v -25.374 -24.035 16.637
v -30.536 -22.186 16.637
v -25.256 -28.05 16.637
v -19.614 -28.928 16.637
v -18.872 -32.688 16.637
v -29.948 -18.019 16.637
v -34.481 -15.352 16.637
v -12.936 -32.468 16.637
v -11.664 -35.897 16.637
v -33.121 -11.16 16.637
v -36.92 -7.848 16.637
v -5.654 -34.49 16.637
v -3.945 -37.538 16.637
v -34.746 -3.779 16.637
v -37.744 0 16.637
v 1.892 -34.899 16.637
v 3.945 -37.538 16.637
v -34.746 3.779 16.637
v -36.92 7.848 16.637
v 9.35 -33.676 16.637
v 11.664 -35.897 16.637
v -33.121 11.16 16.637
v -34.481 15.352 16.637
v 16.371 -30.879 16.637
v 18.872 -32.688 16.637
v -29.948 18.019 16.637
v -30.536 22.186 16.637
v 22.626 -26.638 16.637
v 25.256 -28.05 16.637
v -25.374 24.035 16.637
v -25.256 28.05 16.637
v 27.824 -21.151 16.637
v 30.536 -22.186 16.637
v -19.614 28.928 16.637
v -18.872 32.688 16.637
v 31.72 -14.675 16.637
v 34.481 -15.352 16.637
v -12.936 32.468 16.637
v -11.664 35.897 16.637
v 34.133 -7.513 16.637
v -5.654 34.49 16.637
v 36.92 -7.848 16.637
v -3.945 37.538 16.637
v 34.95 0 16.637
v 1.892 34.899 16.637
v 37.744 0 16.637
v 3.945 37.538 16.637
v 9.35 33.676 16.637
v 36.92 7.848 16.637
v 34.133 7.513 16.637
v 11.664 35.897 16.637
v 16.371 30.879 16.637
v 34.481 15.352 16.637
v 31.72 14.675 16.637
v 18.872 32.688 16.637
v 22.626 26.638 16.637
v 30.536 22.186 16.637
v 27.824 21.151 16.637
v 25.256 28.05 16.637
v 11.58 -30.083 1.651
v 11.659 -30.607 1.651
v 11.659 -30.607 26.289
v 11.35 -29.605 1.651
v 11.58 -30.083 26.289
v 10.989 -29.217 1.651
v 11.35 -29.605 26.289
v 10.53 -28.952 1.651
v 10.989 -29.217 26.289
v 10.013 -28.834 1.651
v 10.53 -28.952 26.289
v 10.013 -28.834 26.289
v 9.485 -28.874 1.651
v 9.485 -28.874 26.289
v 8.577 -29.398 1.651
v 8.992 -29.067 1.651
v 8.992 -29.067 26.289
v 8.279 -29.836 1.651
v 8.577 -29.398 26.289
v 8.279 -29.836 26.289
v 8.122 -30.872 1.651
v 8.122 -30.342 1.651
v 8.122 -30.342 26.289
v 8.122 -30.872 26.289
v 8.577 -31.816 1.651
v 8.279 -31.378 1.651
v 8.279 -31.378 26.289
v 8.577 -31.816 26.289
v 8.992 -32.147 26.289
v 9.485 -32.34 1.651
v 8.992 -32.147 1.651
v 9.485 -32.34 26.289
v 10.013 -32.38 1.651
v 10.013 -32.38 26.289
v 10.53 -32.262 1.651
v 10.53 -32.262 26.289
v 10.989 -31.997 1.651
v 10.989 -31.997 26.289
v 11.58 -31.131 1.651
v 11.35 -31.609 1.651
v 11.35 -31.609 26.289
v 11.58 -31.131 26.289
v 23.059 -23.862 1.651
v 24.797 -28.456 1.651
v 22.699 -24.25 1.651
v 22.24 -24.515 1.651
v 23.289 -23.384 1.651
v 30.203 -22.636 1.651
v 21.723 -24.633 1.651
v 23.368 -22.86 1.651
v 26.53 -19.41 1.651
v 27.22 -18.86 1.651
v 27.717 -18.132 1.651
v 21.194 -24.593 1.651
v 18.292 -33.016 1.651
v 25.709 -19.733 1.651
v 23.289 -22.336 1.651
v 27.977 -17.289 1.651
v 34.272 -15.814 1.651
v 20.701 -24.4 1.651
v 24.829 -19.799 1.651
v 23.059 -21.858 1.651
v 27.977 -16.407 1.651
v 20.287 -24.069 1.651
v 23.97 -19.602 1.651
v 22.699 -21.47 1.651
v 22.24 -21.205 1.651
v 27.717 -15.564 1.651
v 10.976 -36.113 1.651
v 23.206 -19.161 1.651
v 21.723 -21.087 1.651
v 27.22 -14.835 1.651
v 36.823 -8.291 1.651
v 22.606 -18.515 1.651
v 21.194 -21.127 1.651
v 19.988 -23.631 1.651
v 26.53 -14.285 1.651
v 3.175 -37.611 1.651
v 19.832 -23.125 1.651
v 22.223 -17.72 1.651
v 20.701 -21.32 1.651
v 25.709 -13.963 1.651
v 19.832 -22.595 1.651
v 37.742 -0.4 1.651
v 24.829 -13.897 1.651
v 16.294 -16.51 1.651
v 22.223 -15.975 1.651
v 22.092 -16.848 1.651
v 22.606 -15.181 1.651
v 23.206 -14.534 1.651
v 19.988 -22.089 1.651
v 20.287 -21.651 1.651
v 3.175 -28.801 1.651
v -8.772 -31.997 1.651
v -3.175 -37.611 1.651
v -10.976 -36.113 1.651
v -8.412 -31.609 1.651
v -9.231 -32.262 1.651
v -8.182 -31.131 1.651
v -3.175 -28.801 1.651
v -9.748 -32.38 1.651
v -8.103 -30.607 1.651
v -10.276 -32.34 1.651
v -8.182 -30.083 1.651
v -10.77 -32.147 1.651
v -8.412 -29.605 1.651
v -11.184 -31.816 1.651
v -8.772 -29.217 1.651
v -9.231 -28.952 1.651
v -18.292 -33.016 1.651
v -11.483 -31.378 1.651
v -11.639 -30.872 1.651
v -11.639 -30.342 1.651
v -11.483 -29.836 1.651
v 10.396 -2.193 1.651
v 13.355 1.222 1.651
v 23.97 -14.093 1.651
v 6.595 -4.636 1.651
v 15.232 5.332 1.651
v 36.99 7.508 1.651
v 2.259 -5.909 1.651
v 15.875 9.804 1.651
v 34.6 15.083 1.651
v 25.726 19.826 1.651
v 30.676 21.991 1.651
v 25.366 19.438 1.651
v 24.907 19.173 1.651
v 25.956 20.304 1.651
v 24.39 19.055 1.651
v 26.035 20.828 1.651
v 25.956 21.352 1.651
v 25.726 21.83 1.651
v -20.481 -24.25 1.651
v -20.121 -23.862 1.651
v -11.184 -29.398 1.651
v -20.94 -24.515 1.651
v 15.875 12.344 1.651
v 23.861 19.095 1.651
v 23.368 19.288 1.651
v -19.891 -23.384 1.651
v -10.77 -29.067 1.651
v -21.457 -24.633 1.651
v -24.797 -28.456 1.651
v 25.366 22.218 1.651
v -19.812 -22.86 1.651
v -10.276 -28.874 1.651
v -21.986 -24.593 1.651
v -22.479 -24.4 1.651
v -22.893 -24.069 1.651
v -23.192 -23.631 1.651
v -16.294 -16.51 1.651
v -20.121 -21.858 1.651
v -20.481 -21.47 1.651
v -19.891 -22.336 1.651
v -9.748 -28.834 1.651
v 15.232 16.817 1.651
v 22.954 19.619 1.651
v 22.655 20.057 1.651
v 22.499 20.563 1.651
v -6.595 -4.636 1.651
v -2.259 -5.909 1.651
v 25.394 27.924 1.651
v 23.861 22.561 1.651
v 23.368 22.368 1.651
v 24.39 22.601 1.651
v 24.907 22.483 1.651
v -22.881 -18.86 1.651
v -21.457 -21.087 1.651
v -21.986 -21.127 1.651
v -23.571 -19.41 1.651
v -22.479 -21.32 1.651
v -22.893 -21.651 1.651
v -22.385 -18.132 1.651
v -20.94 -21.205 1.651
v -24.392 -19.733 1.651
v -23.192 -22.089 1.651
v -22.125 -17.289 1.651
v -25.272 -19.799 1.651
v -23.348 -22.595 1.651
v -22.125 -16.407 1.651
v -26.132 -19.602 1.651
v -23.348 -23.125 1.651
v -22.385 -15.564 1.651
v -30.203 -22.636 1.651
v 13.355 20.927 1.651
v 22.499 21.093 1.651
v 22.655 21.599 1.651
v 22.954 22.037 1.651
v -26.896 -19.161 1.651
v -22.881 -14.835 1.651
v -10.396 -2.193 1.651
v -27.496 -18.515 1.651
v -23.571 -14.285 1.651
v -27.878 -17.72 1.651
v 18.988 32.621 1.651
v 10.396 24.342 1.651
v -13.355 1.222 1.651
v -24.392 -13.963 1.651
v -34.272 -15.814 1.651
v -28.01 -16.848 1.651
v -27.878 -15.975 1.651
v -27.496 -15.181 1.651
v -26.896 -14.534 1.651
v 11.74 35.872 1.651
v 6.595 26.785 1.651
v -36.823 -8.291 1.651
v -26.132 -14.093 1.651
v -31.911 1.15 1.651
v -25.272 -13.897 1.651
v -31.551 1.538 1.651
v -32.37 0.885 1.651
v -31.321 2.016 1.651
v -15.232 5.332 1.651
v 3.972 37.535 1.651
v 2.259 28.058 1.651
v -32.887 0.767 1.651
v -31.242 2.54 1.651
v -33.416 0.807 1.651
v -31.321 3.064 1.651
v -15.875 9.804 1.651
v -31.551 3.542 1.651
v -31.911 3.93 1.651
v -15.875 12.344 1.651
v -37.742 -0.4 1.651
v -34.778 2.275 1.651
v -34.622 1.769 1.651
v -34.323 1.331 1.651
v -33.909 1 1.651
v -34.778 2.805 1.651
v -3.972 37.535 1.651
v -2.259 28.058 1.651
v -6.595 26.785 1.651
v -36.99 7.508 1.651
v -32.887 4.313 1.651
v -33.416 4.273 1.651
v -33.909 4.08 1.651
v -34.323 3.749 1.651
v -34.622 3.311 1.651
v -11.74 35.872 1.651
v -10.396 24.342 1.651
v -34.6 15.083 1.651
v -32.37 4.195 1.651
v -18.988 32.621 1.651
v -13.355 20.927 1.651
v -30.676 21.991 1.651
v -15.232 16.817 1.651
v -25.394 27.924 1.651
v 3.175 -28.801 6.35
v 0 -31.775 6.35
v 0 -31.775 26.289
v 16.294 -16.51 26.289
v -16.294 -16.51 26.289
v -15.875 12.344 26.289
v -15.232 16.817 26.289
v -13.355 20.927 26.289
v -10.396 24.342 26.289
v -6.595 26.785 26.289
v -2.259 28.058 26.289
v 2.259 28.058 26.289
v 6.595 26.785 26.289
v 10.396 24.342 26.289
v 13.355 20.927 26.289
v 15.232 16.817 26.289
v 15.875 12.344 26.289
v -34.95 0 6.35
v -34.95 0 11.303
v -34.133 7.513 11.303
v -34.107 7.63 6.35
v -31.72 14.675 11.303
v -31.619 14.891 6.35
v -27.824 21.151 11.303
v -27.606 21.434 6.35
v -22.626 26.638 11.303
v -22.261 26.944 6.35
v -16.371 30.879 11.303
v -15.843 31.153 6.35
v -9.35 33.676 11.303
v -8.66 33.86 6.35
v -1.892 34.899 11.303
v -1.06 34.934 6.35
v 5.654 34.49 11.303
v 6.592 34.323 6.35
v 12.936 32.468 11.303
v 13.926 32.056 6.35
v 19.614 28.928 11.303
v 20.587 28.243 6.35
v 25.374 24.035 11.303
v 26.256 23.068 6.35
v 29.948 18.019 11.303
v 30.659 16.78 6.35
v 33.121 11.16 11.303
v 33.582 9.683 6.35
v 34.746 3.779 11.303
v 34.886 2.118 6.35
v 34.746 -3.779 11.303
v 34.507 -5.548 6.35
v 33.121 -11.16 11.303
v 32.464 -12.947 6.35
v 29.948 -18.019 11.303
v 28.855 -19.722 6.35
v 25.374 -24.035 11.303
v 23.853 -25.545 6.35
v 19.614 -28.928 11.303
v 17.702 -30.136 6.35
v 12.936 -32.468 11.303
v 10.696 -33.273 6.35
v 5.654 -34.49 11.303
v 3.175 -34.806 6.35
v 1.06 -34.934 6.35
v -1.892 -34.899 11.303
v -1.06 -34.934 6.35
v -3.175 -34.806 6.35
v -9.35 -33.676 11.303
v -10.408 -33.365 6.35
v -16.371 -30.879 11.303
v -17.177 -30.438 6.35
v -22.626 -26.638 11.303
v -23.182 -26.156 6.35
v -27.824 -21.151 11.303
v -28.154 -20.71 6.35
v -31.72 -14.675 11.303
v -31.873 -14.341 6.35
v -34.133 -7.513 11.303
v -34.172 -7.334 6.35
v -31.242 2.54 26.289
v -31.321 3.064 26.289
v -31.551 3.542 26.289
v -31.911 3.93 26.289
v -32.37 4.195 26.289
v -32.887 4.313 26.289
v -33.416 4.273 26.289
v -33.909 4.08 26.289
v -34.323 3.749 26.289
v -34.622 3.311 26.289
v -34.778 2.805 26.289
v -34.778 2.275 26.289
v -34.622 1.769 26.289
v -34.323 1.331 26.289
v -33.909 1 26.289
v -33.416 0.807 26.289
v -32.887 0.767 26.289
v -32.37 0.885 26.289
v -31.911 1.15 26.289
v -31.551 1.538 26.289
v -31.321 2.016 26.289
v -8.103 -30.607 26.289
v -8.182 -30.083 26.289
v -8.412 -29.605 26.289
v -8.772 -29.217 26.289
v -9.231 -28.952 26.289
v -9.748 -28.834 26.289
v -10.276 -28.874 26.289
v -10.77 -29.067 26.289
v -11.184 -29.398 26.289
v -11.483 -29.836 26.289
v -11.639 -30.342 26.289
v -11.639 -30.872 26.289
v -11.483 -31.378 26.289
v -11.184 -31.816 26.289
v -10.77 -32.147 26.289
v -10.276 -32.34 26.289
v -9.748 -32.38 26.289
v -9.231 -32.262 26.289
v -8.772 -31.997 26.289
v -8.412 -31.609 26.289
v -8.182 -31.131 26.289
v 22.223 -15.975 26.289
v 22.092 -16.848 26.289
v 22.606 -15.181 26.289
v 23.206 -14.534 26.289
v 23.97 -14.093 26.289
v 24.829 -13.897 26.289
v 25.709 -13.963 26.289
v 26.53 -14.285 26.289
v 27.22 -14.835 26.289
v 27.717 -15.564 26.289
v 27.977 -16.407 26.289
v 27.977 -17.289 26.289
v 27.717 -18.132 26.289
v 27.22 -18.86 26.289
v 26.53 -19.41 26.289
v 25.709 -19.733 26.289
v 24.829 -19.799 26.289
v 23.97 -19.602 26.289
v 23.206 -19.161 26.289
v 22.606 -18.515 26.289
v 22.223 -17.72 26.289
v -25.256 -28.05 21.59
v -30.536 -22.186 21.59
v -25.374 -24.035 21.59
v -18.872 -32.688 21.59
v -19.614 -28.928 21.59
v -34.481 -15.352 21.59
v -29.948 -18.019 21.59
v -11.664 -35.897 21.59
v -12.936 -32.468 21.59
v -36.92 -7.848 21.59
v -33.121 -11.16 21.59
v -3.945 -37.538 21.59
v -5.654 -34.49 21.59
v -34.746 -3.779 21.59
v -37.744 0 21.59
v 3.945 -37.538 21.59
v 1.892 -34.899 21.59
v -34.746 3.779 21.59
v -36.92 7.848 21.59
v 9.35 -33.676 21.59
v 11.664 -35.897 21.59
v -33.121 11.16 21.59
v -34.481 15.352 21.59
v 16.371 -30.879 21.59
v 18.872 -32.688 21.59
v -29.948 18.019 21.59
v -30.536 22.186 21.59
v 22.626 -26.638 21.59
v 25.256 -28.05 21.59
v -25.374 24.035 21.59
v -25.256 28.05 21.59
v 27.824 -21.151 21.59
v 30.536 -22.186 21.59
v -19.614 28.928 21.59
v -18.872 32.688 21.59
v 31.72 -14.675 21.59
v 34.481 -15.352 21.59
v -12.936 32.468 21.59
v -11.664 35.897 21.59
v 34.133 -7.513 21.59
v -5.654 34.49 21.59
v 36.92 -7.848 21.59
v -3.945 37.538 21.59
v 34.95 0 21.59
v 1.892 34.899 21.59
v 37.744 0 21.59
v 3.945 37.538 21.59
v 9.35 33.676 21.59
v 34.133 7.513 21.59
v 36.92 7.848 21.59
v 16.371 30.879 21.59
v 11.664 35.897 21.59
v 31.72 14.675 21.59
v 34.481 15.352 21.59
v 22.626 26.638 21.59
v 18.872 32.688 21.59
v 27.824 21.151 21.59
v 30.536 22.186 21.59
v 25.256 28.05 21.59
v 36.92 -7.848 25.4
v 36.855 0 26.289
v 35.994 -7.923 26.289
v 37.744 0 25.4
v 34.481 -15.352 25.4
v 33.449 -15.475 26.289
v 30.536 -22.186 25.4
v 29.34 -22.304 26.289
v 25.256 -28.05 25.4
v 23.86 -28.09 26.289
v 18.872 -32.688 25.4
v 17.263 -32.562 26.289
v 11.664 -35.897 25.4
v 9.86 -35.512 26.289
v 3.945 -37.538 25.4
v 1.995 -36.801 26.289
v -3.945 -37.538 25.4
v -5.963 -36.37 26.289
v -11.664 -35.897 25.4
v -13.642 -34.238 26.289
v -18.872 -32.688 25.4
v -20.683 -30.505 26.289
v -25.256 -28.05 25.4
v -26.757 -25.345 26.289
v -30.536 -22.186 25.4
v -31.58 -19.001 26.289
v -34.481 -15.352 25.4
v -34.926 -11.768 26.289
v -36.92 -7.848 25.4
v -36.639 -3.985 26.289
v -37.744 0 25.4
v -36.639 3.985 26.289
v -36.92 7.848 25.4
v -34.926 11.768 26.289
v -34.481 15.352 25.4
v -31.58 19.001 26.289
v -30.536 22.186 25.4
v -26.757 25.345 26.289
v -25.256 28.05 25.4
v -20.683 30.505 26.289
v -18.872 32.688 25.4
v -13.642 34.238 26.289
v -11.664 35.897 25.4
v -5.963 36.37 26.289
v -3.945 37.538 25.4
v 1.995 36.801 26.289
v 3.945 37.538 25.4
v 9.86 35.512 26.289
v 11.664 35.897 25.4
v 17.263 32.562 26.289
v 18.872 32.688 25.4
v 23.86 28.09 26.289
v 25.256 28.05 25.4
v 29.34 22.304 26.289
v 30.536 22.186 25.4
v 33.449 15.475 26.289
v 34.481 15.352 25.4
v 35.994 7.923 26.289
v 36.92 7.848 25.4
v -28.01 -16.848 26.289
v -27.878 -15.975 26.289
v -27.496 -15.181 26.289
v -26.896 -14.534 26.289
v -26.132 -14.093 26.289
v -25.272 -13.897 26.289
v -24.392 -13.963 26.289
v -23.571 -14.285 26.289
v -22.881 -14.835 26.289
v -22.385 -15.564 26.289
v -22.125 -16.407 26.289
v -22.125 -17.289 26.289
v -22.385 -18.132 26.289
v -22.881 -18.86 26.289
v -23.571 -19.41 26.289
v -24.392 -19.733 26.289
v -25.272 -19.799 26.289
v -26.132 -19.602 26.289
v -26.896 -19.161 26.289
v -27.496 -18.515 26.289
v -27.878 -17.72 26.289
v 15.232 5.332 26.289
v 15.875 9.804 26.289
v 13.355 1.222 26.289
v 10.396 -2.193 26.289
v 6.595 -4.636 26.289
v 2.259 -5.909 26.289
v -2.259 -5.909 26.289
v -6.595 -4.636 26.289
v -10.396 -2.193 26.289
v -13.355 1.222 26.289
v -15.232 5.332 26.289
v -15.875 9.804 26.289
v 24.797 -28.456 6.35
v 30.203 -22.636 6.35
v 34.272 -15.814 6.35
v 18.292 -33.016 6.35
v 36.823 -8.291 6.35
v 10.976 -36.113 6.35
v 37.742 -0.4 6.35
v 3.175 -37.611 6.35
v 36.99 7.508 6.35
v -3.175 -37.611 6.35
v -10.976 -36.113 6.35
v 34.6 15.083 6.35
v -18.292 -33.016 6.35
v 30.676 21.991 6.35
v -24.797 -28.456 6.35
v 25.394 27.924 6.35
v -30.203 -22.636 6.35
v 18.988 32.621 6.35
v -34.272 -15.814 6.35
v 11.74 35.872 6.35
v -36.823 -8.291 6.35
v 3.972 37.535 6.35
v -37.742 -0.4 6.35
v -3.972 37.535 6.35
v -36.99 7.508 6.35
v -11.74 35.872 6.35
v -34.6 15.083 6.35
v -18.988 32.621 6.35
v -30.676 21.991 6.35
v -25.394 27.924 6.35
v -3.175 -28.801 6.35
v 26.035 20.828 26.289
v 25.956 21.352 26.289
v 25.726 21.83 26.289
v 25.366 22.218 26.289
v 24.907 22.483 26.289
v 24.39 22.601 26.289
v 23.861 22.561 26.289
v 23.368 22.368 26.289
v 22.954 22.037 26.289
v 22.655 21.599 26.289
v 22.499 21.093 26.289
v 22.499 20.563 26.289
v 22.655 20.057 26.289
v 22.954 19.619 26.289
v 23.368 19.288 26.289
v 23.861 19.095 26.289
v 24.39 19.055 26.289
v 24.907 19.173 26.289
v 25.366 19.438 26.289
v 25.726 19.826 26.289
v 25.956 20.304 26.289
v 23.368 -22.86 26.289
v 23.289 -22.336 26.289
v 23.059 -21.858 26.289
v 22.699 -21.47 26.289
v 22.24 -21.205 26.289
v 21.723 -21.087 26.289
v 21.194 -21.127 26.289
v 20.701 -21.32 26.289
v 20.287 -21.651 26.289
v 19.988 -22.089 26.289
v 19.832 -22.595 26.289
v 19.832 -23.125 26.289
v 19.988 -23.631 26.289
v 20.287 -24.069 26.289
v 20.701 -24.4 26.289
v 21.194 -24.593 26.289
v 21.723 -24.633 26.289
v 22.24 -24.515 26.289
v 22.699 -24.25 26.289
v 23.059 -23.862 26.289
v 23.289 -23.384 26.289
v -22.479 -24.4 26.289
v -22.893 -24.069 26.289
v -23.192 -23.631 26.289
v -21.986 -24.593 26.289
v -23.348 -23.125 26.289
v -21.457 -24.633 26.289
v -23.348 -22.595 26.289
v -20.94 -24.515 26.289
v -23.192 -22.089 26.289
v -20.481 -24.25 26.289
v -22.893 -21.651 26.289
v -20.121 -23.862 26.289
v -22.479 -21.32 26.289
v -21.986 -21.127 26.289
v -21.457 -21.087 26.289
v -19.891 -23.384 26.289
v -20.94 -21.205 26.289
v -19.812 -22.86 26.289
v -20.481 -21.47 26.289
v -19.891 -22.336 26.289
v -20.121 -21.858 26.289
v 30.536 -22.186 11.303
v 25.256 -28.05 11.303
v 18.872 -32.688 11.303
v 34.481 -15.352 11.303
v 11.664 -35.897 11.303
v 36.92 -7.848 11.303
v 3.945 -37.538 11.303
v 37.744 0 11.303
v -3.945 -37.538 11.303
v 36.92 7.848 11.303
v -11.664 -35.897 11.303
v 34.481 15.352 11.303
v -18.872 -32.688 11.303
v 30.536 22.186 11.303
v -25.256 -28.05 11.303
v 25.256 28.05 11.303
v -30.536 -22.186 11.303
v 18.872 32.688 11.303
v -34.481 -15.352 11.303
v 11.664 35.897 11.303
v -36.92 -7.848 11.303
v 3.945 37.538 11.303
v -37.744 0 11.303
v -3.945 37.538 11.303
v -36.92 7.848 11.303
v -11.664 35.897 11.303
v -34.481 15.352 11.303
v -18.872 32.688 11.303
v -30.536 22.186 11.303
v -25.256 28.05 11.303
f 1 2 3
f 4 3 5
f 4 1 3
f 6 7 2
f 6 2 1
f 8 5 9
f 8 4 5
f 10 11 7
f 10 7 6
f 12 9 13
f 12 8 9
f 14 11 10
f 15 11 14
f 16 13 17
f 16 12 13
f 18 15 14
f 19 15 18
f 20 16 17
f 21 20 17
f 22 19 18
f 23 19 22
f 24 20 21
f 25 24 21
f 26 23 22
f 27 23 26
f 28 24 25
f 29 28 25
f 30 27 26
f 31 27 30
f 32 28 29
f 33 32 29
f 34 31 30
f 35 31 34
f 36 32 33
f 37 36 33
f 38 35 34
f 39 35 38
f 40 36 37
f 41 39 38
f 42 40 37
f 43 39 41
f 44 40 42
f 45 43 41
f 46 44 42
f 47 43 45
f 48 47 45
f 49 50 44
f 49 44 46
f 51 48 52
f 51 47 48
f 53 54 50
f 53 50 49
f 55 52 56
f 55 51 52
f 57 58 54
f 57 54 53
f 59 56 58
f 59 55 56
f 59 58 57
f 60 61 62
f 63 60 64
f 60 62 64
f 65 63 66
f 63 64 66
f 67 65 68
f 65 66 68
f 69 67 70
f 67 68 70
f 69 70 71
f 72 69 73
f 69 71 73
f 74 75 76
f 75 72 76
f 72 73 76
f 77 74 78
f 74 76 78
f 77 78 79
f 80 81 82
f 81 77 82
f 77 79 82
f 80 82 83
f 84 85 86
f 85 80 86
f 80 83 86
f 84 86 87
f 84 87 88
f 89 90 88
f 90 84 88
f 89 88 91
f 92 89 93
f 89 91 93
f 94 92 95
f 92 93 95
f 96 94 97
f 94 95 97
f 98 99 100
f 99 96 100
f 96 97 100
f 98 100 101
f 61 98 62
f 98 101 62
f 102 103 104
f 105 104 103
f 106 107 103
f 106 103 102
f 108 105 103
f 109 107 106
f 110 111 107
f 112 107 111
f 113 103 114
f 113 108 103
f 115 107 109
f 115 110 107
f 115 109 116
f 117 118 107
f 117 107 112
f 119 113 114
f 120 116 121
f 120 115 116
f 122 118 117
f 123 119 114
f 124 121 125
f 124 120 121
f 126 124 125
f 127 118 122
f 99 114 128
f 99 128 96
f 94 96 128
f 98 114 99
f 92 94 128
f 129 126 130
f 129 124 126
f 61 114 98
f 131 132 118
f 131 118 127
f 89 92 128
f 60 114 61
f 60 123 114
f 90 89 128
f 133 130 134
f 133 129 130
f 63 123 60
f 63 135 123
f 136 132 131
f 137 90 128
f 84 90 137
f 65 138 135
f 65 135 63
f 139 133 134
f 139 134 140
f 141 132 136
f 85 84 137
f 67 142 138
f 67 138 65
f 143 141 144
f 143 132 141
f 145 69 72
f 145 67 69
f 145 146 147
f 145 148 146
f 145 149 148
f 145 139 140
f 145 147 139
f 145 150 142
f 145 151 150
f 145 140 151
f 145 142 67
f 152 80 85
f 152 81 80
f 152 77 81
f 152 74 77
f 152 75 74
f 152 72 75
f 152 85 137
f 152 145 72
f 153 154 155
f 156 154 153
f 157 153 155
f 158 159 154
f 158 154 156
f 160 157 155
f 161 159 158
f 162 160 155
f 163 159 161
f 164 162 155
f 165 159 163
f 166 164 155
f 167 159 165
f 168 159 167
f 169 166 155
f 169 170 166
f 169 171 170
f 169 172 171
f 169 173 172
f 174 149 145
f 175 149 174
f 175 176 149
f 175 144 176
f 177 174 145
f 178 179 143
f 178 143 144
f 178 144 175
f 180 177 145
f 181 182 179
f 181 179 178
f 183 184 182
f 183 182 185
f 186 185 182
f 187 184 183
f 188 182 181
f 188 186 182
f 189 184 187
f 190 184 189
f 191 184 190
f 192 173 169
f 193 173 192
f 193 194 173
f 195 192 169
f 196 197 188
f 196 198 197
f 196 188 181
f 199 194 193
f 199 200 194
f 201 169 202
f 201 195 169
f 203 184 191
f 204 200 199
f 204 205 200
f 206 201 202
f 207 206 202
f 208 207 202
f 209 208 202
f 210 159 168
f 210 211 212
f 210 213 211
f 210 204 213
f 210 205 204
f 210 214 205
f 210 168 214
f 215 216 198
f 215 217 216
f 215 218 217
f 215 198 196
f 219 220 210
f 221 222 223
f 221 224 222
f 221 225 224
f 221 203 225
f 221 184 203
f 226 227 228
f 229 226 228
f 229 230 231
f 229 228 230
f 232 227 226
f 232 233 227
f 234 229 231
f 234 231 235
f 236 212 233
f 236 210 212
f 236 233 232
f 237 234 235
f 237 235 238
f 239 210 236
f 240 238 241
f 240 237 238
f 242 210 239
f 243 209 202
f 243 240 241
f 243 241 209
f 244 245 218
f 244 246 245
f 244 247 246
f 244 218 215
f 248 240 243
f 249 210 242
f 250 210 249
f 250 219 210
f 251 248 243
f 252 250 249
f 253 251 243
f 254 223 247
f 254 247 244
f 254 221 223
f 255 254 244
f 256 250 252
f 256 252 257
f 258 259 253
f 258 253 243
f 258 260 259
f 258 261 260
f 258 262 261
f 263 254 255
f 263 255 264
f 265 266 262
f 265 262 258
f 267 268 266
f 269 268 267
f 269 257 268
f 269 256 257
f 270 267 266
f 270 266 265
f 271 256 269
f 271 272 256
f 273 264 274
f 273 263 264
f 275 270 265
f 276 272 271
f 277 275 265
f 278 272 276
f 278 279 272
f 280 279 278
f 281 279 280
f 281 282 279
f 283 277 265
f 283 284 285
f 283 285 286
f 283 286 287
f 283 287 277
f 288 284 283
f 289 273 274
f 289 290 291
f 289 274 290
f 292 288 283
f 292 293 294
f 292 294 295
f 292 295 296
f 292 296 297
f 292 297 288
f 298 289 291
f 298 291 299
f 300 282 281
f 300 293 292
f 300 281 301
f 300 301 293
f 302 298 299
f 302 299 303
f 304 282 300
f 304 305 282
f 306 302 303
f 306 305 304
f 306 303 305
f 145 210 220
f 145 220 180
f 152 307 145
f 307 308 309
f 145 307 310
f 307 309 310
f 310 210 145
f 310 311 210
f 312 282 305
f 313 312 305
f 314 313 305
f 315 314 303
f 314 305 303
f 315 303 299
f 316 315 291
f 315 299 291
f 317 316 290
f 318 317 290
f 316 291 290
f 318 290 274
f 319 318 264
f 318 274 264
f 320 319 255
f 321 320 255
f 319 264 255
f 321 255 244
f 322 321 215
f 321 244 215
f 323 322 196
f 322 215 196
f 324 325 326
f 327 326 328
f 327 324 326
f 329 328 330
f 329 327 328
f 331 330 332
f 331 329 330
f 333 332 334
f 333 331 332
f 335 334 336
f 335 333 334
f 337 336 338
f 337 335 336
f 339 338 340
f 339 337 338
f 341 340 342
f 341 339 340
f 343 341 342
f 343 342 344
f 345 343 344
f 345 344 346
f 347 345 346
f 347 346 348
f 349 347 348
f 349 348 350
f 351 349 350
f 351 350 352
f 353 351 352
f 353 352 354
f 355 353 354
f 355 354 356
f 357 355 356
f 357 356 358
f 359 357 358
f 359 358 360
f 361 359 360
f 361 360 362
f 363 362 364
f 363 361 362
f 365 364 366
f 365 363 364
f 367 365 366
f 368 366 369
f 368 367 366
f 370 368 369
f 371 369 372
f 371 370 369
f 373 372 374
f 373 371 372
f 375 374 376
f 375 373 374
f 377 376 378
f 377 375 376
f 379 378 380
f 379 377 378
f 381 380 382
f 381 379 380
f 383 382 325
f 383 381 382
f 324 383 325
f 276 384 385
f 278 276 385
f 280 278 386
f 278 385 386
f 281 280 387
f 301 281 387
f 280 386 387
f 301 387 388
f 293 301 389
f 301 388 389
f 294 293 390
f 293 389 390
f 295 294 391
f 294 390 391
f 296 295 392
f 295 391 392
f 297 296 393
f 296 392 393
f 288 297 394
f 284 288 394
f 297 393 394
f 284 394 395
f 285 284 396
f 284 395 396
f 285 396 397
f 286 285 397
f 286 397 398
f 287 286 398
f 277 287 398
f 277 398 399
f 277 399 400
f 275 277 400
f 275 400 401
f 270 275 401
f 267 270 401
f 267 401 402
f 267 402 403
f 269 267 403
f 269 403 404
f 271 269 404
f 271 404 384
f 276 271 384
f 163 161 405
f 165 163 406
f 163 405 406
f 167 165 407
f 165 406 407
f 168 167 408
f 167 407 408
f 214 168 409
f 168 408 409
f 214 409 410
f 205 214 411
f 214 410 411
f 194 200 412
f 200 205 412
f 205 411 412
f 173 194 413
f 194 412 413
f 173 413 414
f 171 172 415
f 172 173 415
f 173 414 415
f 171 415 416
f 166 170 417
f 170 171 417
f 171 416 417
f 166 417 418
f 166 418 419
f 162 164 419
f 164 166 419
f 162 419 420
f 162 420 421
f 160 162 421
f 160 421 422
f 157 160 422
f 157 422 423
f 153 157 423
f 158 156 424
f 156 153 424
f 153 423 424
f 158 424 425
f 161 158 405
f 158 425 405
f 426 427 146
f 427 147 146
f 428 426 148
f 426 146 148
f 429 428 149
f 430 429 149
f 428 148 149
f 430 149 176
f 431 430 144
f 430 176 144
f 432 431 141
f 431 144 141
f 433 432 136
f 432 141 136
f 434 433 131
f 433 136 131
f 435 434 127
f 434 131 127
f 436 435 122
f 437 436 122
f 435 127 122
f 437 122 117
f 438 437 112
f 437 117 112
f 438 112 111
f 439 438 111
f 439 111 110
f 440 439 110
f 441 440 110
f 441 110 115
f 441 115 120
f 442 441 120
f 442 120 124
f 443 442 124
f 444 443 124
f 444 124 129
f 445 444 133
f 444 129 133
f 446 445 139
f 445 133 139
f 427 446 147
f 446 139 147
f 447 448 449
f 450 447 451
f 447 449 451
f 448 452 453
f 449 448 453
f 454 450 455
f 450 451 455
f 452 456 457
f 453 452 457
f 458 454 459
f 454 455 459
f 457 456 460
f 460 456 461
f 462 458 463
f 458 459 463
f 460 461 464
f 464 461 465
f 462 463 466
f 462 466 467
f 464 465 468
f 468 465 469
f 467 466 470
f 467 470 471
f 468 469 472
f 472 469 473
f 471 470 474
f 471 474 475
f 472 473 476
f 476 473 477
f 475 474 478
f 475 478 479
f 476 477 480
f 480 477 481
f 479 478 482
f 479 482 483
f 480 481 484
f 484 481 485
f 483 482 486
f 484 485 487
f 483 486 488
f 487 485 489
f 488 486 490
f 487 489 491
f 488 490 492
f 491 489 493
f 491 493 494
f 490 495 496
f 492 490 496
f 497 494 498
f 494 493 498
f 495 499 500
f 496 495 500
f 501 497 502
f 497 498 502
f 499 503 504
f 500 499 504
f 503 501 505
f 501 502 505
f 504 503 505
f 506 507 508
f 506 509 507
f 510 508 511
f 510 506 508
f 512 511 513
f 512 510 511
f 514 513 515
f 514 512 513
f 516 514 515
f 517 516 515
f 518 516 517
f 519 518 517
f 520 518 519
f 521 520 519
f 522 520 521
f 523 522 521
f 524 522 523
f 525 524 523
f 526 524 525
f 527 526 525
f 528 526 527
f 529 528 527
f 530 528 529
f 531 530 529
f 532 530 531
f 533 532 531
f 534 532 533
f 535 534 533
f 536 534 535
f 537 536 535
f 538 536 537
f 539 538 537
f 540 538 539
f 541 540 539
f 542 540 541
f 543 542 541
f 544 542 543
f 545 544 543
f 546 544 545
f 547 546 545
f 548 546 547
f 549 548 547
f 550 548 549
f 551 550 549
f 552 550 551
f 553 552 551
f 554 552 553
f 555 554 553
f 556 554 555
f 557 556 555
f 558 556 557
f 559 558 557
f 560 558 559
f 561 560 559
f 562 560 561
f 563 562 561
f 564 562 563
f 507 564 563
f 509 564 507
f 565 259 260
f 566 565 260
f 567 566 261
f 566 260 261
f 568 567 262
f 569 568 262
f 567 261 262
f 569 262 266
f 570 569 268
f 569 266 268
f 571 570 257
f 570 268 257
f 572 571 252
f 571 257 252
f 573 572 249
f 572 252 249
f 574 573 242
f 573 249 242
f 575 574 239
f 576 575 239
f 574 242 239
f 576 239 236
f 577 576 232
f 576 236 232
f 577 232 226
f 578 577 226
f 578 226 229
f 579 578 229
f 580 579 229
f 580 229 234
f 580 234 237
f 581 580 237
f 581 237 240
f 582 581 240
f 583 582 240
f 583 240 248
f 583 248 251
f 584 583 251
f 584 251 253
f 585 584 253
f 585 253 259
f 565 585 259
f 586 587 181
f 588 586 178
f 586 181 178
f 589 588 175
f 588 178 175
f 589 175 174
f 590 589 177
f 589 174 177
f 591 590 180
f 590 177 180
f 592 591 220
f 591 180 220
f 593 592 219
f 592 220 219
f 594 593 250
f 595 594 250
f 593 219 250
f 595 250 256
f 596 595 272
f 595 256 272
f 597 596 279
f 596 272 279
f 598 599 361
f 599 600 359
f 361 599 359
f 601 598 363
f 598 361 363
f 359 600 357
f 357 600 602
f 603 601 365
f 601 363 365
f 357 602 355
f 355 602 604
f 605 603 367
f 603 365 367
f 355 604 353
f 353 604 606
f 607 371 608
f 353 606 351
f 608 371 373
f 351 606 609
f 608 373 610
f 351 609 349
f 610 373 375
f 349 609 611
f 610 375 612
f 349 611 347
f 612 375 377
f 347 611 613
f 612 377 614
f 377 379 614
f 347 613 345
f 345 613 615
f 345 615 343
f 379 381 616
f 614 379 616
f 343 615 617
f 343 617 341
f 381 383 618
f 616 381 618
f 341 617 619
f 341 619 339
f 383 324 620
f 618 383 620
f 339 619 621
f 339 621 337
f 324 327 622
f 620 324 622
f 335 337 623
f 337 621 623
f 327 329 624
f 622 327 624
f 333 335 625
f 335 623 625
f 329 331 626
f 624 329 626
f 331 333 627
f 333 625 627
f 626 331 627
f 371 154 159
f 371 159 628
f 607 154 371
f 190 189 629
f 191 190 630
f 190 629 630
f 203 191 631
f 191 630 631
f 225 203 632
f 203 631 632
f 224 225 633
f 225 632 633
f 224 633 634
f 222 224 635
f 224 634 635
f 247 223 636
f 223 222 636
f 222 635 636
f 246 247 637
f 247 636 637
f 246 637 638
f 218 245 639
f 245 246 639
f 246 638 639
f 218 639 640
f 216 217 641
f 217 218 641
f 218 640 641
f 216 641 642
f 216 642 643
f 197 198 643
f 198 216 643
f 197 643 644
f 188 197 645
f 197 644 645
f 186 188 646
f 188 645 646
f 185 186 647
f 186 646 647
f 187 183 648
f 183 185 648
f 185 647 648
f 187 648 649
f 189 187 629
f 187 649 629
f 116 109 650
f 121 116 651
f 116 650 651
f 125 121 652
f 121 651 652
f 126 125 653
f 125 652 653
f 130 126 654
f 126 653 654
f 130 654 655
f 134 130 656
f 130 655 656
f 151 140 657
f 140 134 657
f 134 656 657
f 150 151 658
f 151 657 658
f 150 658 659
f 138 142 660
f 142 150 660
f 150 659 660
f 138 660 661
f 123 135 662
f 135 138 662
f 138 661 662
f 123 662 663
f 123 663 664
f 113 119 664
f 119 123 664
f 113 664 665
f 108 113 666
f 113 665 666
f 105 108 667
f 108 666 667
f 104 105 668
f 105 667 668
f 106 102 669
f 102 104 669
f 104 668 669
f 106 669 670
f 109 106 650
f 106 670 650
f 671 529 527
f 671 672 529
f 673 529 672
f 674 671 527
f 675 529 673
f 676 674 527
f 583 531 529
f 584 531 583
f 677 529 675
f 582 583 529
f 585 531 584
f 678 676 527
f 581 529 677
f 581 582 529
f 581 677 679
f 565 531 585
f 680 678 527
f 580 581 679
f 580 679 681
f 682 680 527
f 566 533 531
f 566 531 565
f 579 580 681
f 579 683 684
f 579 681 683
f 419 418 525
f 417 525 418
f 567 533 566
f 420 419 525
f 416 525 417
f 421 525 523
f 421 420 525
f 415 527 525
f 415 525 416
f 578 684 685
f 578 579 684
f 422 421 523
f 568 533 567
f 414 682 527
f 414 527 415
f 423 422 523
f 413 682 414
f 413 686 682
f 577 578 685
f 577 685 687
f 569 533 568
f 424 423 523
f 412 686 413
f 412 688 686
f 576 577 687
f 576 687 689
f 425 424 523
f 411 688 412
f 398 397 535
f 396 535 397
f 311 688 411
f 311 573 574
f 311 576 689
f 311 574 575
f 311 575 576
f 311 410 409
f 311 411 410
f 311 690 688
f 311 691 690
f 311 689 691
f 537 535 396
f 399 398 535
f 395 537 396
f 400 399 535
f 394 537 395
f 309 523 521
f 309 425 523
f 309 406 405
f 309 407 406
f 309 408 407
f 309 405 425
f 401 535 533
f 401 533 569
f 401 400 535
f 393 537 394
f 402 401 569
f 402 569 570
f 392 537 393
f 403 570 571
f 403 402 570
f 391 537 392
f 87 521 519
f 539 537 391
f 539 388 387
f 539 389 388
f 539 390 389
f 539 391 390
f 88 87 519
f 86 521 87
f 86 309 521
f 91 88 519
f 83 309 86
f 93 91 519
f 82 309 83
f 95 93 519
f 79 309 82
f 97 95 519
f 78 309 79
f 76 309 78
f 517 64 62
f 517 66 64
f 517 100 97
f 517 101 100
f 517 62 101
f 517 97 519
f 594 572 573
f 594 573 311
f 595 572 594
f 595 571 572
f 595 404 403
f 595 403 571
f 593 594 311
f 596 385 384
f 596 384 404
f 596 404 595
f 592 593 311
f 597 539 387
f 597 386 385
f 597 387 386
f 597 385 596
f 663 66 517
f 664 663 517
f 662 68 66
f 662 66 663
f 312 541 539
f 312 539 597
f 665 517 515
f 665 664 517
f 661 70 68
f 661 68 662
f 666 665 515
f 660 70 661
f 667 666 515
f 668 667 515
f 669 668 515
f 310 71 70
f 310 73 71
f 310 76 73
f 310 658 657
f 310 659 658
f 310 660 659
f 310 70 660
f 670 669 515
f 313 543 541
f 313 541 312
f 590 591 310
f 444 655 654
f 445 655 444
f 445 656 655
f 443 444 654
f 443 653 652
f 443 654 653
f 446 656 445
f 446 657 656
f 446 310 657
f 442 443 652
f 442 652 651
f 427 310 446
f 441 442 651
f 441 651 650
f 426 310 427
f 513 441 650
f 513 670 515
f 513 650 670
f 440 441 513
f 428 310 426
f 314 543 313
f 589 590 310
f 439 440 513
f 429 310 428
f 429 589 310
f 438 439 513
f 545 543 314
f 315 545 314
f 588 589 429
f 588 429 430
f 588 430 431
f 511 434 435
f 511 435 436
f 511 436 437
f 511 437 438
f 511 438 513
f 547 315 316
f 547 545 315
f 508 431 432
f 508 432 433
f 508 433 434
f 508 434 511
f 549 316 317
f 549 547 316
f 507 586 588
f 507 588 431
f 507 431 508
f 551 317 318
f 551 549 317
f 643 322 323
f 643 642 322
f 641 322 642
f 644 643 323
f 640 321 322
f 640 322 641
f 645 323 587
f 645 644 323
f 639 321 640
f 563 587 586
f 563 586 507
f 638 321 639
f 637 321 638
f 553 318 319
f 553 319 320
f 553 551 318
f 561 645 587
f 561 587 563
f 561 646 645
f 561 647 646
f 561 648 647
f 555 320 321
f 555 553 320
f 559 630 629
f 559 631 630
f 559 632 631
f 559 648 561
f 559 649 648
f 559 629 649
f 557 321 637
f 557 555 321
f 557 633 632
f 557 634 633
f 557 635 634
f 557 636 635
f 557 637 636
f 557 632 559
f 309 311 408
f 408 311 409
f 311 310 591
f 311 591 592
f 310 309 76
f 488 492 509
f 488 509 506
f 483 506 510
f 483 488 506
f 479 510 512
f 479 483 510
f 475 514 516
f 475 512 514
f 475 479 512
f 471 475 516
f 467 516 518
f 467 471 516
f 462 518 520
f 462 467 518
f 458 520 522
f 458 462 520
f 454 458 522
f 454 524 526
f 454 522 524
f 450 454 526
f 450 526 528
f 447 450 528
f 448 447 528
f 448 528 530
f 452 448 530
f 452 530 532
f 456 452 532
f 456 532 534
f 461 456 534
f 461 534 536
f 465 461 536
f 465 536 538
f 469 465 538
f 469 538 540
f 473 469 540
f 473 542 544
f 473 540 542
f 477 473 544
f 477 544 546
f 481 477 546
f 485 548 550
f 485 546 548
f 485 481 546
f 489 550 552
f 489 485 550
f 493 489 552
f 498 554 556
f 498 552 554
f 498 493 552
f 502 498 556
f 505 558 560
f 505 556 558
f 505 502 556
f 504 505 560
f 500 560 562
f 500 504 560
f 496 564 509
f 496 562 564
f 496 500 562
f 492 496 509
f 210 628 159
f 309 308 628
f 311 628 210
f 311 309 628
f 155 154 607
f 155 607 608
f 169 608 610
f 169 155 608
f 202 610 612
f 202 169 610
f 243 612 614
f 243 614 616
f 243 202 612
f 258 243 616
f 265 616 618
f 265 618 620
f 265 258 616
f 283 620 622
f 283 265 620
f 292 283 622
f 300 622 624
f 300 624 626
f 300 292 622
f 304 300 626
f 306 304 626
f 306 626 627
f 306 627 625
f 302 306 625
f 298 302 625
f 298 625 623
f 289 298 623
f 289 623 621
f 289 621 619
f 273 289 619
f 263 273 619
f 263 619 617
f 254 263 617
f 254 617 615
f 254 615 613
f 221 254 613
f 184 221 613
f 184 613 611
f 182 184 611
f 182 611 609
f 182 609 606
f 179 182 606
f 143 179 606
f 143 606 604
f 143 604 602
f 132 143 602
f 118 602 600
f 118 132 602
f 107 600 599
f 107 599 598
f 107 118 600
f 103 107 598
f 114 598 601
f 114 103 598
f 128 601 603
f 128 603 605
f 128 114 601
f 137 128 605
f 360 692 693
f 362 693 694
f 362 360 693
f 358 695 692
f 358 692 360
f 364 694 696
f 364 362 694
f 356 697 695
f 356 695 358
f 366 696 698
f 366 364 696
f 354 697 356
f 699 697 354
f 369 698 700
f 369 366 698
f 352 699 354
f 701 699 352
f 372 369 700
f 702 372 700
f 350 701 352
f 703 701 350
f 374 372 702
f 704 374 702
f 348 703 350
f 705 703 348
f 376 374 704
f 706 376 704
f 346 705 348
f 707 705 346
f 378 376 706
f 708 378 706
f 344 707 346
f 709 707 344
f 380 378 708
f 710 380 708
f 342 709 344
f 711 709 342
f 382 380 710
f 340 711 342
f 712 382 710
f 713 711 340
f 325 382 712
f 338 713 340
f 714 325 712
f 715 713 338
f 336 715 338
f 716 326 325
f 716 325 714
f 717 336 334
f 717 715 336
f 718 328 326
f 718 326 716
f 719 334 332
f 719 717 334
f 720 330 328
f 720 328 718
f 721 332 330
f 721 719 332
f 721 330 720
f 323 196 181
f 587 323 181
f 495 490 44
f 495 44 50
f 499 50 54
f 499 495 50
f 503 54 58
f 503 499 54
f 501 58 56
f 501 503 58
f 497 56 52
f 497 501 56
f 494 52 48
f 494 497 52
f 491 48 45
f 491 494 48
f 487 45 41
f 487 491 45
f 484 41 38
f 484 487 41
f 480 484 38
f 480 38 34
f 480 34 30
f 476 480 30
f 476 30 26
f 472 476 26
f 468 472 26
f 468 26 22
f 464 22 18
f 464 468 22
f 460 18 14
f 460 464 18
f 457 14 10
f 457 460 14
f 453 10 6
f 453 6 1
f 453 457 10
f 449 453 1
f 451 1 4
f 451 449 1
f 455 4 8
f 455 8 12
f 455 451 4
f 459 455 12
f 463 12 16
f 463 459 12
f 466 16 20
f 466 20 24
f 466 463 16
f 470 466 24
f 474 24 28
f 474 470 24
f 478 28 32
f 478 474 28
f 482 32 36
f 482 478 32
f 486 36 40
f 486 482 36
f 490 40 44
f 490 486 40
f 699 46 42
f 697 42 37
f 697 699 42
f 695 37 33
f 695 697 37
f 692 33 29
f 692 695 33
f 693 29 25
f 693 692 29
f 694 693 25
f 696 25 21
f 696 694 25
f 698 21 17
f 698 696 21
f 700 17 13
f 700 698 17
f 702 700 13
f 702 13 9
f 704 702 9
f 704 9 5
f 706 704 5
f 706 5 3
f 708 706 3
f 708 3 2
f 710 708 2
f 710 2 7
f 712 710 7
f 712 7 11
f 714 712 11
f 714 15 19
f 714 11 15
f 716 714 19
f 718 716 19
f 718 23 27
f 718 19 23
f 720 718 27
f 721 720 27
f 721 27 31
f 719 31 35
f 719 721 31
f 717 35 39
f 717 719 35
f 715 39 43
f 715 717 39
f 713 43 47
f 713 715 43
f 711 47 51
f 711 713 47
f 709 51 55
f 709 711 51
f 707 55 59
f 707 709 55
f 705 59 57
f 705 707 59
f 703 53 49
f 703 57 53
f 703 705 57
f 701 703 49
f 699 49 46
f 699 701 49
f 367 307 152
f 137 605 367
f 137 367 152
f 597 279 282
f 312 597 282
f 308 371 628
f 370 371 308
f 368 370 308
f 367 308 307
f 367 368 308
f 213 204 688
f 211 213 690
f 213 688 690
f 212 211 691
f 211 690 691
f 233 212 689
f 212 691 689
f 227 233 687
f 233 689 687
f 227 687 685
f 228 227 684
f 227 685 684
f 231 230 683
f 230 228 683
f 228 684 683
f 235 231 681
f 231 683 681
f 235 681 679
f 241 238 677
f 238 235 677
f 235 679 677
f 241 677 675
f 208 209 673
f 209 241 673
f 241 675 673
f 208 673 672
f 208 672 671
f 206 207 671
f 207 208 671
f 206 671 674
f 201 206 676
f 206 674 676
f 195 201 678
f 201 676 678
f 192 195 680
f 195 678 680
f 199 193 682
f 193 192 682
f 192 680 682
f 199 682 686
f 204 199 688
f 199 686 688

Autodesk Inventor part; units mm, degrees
sketch "Sketch1" plane through (0, 0, 0) normal (0, 0, 1) x (1, 0, 0)
  circle A0 centre (0, 0) radius 37.7444
  dimension "d0" = 75.4888
extrude "Extrusion1" add sketch "Sketch1" along normal blind 27.94
ref_plane "Work Plane1" through (0, 0, 21.59) normal (0, 0, 1) x (1, 0, 0)
sketch "Sketch2" plane through (0, 0, 21.59) normal (0, 0, 1) x (1, 0, 0)
  circle A0 centre (0, 0) radius 34.9504
  circle A1 centre (0, 0) radius 37.7444 projected
  dimension "d4" = 2.794
extrude "Extrusion2" cut sketch "Sketch2" against normal blind 4.953
ref_plane "Work Plane2" through (0, 0, 6.35) normal (0, 0, -1) x (-1, 0, 0)
sketch "Sketch3" plane through (0, 0, 6.35) normal (0, 0, -1) x (-1, 0, 0)
  circle A0 centre (0, 0) radius 34.9504
  circle A1 centre (0, 0) radius 37.7444 projected
  dimension "d8" = 2.794
extrude "Extrusion3" cut sketch "Sketch3" against normal blind 4.953
sketch "Sketch4" plane through (0, 0, 0) normal (0, 0, -1) x (-1, 0, 0)
  circle A0 centre (0, 0) radius 31.7754
  line L0 (-29.1271, -12.7) -> (29.1271, -12.7)
  line L1 (-19.685, -12.7) -> (-19.685, 24.9435)
  line L2 (19.685, -12.7) -> (19.685, 24.9435)
  line L3 (0, -52.8422) -> (0, 52.8422) projected
  circle A1 centre (0, 0) radius 37.7444 projected
  line L4 (52.8422, 0) -> (-52.8422, 0) projected
  dimension "d11" = 39.37
  dimension "d12" = 5.969
  dimension "d25" = 12.7
extrude "Extrusion4" [suppressed]
sketch "Sketch5" plane through (0, 0, 27.94) normal (0, 0, 1) x (1, 0, 0)
  circle A0 centre (24.257, 20.828) radius 1.778
  circle A1 centre (-21.59, -22.86) radius 1.778
  circle A2 centre (21.59, -22.86) radius 1.778
  line L0 (0, -52.8422) -> (0, 52.8422) projected
  line L1 (-52.8422, 0) -> (52.8422, 0) projected
  circle A3 centre (-33.02, 2.54) radius 1.778
  point P0 (0, 0)
  dimension "d16" = 3.556
  dimension "d17" = 3.556
  dimension "d18" = 3.556
  dimension "d19" = 20.828
  dimension "d20" = 24.257
  dimension "d21" = 22.86
  dimension "d22" = 21.59
  dimension "d64" = 3.556
  dimension "d65" = 2.54
  dimension "d66" = 33.02
extrude "Extrusion5" cut sketch "Sketch5" against normal through all
sketch "Sketch6" plane through (0, 0, 27.94) normal (0, 0, 1) x (1, 0, 0)
  circle A0 centre (21.59, -22.86) radius 1.778 projected
  circle A1 centre (24.257, 20.828) radius 1.778 projected
  circle A2 centre (-21.59, -22.86) radius 1.778 projected
  circle A3 centre (0, 0) radius 37.7444 projected
  circle A4 centre (-21.59, -22.86) radius 1.778 projected
  circle A5 centre (-21.59, -22.86) radius 8.255
  circle A6 centre (21.59, -22.86) radius 8.255
  line L0 (-16.3153, -16.51) -> (26.8647, -16.51)
  circle A7 centre (0, 0) radius 34.9504 projected
  circle A8 centre (0, 0) radius 31.7754
  line L1 (0, -31.7754) -> (-16.2938, -16.51)
  line L2 (0, -31.7754) -> (16.2938, -16.51)
  dimension "d26" = 16.51
  dimension "d27" = 16.51
extrude "Extrusion6" cut sketch "Sketch6" against normal through all contours L2 L1 L0
fillet "Fillet1" [suppressed]
chamfer "Chamfer1" distance 2.54 angle 45 1 edges at (-37.7444, 0, 27.94)
sketch "Sketch9" plane through (0, 0, 27.94) normal (0, 0, 1) x (1, 0, 0)
  circle A0 centre (-9.8806, -30.607) radius 1.778
  circle A1 centre (9.8806, -30.607) radius 1.778
  line L0 (-52.8422, 0) -> (52.8422, 0) projected
  line L1 (0, -52.8422) -> (0, 52.8422) projected
  line L2 (-14.9225, -28.448) -> (14.9225, -28.448)
  line L3 (14.9225, -28.448) -> (14.9225, -34.163)
  line L4 (14.9225, -34.163) -> (-14.9225, -34.163)
  line L5 (-14.9225, -34.163) -> (-14.9225, -28.448)
  point P0 (0, 0)
  dimension "d45" = 3.556
  dimension "d46" = 3.556
  dimension "d47" = 19.7612
  dimension "d48" = 29.845
  dimension "d49" = 5.715
  dimension "d50" = 3.556
  dimension "d51" = 34.163
extrude "Extrusion9" cut sketch "Sketch9" against normal through all contours A0 | A1
sketch "Sketch11" plane through (0, 0, 0) normal (0, 0, -1) x (-1, 0, 0)
  circle A0 centre (-9.8806, -30.607) radius 1.778 projected
  circle A1 centre (9.8806, -30.607) radius 1.778 projected
  line L0 (16.2938, -16.51) -> (0, -31.7754) projected
  line L1 (0, -31.7754) -> (-16.2938, -16.51) projected
  line L2 (-16.2938, -16.51) -> (16.2938, -16.51) projected
  circle A2 centre (-21.59, -22.86) radius 1.778 projected
  circle A3 centre (-24.257, 20.828) radius 1.778 projected
  circle A4 centre (21.59, -22.86) radius 1.778 projected
  circle A5 centre (0, 0) radius 37.7444 projected
extrude "Extrusion10" cut sketch "Sketch11" against normal blind 1.651
sketch "Sketch12" plane through (0, 0, 27.94) normal (0, 0, 1) x (1, 0, 0)
  circle A0 centre (9.8806, -30.607) radius 1.778 projected
  circle A1 centre (-9.8806, -30.607) radius 1.778 projected
  circle A2 centre (-21.59, -22.86) radius 1.778 projected
  circle A3 centre (24.257, 20.828) radius 1.778 projected
  circle A4 centre (21.59, -22.86) radius 1.778 projected
  line L0 (0, -31.7754) -> (-16.2938, -16.51) projected
  line L1 (-16.2938, -16.51) -> (16.2938, -16.51) projected
  line L2 (16.2938, -16.51) -> (0, -31.7754) projected
  circle A5 centre (0, 0) radius 35.2044 projected
  circle A6 centre (0, 0) radius 37.7444 projected
extrude "Extrusion11" cut sketch "Sketch12" against normal blind 1.651 contours A0 | A1 | A2 | A3 | A4 | L0 L1 L2 | A5 | A6
ref_plane "Work Plane4" through (-16.2938, -35.56, 1.651) normal (0, -1, 0) x (1, 0, 0)
sketch "Sketch13" plane through (-16.2938, -35.56, 1.651) normal (0, -1, 0) x (1, 0, 0)
  line L0 (16.2938, -7.239) -> (16.2938, 31.877) projected
  line L1 (-36.5483, -1.651) -> (69.136, -1.651) projected
  line L2 (8.1912, 24.638) -> (8.1912, 0) projected
  line L3 (54.0382, 0) -> (-21.4506, 0) projected
  line L4 (-21.4506, 4.699) -> (54.0382, 4.699) projected
  line L5 (39.6618, 24.638) -> (39.6618, 0) projected
  line L6 (51.2442, 4.699) -> (-18.6566, 4.699) projected
  line L7 (-2.049, 0) -> (34.6366, 0) projected
  line L8 (13.1188, 4.699) -> (19.4688, 4.699)
  line L9 (19.4688, 4.699) -> (19.4688, 0)
  line L10 (19.4688, 0) -> (13.1188, 0)
  line L11 (13.1188, 0) -> (13.1188, 4.699)
  point P0 (16.2938, -1.651)
  point P1 (13.1188, 0)
  point P2 (19.4688, 0)
  dimension "d61" = 6.35
extrude "Extrusion12" cut sketch "Sketch13" against normal mid plane 25.4 contours L3 L11 L4 L0 | L0 L4 L9 L3
sketch "Sketch14" plane through (0, 0, 1.651) normal (0, 0, -1) x (-1, 0, 0)
  circle A0 centre (-25.0506, -16.8477) radius 2.9591
  circle A1 centre (25.0506, -16.8477) radius 2.9591
  line L0 (52.8422, 0) -> (-52.8422, 0) projected
  line L1 (0, -52.8422) -> (0, 52.8422) projected
  arc A2 (3.175, -34.8059) -> (-3.175, -34.8059) centre (0, 0) ccw projected
  dimension "d67" = 5.9182
  dimension "d68" = 5.9182
extrude "Extrusion13" cut sketch "Sketch14" against normal through all contours A0 | A1
sketch "Sketch15" plane through (0, 0, 1.651) normal (0, 0, -1) x (-1, 0, 0)
  circle A0 centre (0, 11.0744) radius 15.875
  line L0 (0, 26.9494) -> (0, 37.7444)
  arc A1 (3.175, -37.6106) -> (-3.175, -37.6106) centre (0, 0) ccw projected
  dimension "d71" = 31.75
  dimension "d73" = 10.795
sketch "Sketch16" plane through (0, 0, 1.651) normal (0, 0, -1) x (-1, 0, 0)
  line L0 (0, 9.8044) -> (0, 12.3444) construction
  line L1 (15.875, 9.8044) -> (15.875, 12.3444)
  line L2 (-15.875, 12.3444) -> (-15.875, 9.8044)
  arc A0 (-15.875, 9.8044) -> (15.875, 9.8044) centre (0, 9.8044) ccw
  arc A1 (15.875, 12.3444) -> (-15.875, 12.3444) centre (0, 12.3444) ccw
  line L3 (0, -52.8422) -> (0, 52.8422) projected
  point P0 (0, 0)
  point P1 (0, 11.0744)
  dimension "d75" = 15.875
  dimension "d76" = 2.54
extrude "Extrusion14" cut sketch "Sketch16" against normal through all
properties part number "CameraFrontSupport"
